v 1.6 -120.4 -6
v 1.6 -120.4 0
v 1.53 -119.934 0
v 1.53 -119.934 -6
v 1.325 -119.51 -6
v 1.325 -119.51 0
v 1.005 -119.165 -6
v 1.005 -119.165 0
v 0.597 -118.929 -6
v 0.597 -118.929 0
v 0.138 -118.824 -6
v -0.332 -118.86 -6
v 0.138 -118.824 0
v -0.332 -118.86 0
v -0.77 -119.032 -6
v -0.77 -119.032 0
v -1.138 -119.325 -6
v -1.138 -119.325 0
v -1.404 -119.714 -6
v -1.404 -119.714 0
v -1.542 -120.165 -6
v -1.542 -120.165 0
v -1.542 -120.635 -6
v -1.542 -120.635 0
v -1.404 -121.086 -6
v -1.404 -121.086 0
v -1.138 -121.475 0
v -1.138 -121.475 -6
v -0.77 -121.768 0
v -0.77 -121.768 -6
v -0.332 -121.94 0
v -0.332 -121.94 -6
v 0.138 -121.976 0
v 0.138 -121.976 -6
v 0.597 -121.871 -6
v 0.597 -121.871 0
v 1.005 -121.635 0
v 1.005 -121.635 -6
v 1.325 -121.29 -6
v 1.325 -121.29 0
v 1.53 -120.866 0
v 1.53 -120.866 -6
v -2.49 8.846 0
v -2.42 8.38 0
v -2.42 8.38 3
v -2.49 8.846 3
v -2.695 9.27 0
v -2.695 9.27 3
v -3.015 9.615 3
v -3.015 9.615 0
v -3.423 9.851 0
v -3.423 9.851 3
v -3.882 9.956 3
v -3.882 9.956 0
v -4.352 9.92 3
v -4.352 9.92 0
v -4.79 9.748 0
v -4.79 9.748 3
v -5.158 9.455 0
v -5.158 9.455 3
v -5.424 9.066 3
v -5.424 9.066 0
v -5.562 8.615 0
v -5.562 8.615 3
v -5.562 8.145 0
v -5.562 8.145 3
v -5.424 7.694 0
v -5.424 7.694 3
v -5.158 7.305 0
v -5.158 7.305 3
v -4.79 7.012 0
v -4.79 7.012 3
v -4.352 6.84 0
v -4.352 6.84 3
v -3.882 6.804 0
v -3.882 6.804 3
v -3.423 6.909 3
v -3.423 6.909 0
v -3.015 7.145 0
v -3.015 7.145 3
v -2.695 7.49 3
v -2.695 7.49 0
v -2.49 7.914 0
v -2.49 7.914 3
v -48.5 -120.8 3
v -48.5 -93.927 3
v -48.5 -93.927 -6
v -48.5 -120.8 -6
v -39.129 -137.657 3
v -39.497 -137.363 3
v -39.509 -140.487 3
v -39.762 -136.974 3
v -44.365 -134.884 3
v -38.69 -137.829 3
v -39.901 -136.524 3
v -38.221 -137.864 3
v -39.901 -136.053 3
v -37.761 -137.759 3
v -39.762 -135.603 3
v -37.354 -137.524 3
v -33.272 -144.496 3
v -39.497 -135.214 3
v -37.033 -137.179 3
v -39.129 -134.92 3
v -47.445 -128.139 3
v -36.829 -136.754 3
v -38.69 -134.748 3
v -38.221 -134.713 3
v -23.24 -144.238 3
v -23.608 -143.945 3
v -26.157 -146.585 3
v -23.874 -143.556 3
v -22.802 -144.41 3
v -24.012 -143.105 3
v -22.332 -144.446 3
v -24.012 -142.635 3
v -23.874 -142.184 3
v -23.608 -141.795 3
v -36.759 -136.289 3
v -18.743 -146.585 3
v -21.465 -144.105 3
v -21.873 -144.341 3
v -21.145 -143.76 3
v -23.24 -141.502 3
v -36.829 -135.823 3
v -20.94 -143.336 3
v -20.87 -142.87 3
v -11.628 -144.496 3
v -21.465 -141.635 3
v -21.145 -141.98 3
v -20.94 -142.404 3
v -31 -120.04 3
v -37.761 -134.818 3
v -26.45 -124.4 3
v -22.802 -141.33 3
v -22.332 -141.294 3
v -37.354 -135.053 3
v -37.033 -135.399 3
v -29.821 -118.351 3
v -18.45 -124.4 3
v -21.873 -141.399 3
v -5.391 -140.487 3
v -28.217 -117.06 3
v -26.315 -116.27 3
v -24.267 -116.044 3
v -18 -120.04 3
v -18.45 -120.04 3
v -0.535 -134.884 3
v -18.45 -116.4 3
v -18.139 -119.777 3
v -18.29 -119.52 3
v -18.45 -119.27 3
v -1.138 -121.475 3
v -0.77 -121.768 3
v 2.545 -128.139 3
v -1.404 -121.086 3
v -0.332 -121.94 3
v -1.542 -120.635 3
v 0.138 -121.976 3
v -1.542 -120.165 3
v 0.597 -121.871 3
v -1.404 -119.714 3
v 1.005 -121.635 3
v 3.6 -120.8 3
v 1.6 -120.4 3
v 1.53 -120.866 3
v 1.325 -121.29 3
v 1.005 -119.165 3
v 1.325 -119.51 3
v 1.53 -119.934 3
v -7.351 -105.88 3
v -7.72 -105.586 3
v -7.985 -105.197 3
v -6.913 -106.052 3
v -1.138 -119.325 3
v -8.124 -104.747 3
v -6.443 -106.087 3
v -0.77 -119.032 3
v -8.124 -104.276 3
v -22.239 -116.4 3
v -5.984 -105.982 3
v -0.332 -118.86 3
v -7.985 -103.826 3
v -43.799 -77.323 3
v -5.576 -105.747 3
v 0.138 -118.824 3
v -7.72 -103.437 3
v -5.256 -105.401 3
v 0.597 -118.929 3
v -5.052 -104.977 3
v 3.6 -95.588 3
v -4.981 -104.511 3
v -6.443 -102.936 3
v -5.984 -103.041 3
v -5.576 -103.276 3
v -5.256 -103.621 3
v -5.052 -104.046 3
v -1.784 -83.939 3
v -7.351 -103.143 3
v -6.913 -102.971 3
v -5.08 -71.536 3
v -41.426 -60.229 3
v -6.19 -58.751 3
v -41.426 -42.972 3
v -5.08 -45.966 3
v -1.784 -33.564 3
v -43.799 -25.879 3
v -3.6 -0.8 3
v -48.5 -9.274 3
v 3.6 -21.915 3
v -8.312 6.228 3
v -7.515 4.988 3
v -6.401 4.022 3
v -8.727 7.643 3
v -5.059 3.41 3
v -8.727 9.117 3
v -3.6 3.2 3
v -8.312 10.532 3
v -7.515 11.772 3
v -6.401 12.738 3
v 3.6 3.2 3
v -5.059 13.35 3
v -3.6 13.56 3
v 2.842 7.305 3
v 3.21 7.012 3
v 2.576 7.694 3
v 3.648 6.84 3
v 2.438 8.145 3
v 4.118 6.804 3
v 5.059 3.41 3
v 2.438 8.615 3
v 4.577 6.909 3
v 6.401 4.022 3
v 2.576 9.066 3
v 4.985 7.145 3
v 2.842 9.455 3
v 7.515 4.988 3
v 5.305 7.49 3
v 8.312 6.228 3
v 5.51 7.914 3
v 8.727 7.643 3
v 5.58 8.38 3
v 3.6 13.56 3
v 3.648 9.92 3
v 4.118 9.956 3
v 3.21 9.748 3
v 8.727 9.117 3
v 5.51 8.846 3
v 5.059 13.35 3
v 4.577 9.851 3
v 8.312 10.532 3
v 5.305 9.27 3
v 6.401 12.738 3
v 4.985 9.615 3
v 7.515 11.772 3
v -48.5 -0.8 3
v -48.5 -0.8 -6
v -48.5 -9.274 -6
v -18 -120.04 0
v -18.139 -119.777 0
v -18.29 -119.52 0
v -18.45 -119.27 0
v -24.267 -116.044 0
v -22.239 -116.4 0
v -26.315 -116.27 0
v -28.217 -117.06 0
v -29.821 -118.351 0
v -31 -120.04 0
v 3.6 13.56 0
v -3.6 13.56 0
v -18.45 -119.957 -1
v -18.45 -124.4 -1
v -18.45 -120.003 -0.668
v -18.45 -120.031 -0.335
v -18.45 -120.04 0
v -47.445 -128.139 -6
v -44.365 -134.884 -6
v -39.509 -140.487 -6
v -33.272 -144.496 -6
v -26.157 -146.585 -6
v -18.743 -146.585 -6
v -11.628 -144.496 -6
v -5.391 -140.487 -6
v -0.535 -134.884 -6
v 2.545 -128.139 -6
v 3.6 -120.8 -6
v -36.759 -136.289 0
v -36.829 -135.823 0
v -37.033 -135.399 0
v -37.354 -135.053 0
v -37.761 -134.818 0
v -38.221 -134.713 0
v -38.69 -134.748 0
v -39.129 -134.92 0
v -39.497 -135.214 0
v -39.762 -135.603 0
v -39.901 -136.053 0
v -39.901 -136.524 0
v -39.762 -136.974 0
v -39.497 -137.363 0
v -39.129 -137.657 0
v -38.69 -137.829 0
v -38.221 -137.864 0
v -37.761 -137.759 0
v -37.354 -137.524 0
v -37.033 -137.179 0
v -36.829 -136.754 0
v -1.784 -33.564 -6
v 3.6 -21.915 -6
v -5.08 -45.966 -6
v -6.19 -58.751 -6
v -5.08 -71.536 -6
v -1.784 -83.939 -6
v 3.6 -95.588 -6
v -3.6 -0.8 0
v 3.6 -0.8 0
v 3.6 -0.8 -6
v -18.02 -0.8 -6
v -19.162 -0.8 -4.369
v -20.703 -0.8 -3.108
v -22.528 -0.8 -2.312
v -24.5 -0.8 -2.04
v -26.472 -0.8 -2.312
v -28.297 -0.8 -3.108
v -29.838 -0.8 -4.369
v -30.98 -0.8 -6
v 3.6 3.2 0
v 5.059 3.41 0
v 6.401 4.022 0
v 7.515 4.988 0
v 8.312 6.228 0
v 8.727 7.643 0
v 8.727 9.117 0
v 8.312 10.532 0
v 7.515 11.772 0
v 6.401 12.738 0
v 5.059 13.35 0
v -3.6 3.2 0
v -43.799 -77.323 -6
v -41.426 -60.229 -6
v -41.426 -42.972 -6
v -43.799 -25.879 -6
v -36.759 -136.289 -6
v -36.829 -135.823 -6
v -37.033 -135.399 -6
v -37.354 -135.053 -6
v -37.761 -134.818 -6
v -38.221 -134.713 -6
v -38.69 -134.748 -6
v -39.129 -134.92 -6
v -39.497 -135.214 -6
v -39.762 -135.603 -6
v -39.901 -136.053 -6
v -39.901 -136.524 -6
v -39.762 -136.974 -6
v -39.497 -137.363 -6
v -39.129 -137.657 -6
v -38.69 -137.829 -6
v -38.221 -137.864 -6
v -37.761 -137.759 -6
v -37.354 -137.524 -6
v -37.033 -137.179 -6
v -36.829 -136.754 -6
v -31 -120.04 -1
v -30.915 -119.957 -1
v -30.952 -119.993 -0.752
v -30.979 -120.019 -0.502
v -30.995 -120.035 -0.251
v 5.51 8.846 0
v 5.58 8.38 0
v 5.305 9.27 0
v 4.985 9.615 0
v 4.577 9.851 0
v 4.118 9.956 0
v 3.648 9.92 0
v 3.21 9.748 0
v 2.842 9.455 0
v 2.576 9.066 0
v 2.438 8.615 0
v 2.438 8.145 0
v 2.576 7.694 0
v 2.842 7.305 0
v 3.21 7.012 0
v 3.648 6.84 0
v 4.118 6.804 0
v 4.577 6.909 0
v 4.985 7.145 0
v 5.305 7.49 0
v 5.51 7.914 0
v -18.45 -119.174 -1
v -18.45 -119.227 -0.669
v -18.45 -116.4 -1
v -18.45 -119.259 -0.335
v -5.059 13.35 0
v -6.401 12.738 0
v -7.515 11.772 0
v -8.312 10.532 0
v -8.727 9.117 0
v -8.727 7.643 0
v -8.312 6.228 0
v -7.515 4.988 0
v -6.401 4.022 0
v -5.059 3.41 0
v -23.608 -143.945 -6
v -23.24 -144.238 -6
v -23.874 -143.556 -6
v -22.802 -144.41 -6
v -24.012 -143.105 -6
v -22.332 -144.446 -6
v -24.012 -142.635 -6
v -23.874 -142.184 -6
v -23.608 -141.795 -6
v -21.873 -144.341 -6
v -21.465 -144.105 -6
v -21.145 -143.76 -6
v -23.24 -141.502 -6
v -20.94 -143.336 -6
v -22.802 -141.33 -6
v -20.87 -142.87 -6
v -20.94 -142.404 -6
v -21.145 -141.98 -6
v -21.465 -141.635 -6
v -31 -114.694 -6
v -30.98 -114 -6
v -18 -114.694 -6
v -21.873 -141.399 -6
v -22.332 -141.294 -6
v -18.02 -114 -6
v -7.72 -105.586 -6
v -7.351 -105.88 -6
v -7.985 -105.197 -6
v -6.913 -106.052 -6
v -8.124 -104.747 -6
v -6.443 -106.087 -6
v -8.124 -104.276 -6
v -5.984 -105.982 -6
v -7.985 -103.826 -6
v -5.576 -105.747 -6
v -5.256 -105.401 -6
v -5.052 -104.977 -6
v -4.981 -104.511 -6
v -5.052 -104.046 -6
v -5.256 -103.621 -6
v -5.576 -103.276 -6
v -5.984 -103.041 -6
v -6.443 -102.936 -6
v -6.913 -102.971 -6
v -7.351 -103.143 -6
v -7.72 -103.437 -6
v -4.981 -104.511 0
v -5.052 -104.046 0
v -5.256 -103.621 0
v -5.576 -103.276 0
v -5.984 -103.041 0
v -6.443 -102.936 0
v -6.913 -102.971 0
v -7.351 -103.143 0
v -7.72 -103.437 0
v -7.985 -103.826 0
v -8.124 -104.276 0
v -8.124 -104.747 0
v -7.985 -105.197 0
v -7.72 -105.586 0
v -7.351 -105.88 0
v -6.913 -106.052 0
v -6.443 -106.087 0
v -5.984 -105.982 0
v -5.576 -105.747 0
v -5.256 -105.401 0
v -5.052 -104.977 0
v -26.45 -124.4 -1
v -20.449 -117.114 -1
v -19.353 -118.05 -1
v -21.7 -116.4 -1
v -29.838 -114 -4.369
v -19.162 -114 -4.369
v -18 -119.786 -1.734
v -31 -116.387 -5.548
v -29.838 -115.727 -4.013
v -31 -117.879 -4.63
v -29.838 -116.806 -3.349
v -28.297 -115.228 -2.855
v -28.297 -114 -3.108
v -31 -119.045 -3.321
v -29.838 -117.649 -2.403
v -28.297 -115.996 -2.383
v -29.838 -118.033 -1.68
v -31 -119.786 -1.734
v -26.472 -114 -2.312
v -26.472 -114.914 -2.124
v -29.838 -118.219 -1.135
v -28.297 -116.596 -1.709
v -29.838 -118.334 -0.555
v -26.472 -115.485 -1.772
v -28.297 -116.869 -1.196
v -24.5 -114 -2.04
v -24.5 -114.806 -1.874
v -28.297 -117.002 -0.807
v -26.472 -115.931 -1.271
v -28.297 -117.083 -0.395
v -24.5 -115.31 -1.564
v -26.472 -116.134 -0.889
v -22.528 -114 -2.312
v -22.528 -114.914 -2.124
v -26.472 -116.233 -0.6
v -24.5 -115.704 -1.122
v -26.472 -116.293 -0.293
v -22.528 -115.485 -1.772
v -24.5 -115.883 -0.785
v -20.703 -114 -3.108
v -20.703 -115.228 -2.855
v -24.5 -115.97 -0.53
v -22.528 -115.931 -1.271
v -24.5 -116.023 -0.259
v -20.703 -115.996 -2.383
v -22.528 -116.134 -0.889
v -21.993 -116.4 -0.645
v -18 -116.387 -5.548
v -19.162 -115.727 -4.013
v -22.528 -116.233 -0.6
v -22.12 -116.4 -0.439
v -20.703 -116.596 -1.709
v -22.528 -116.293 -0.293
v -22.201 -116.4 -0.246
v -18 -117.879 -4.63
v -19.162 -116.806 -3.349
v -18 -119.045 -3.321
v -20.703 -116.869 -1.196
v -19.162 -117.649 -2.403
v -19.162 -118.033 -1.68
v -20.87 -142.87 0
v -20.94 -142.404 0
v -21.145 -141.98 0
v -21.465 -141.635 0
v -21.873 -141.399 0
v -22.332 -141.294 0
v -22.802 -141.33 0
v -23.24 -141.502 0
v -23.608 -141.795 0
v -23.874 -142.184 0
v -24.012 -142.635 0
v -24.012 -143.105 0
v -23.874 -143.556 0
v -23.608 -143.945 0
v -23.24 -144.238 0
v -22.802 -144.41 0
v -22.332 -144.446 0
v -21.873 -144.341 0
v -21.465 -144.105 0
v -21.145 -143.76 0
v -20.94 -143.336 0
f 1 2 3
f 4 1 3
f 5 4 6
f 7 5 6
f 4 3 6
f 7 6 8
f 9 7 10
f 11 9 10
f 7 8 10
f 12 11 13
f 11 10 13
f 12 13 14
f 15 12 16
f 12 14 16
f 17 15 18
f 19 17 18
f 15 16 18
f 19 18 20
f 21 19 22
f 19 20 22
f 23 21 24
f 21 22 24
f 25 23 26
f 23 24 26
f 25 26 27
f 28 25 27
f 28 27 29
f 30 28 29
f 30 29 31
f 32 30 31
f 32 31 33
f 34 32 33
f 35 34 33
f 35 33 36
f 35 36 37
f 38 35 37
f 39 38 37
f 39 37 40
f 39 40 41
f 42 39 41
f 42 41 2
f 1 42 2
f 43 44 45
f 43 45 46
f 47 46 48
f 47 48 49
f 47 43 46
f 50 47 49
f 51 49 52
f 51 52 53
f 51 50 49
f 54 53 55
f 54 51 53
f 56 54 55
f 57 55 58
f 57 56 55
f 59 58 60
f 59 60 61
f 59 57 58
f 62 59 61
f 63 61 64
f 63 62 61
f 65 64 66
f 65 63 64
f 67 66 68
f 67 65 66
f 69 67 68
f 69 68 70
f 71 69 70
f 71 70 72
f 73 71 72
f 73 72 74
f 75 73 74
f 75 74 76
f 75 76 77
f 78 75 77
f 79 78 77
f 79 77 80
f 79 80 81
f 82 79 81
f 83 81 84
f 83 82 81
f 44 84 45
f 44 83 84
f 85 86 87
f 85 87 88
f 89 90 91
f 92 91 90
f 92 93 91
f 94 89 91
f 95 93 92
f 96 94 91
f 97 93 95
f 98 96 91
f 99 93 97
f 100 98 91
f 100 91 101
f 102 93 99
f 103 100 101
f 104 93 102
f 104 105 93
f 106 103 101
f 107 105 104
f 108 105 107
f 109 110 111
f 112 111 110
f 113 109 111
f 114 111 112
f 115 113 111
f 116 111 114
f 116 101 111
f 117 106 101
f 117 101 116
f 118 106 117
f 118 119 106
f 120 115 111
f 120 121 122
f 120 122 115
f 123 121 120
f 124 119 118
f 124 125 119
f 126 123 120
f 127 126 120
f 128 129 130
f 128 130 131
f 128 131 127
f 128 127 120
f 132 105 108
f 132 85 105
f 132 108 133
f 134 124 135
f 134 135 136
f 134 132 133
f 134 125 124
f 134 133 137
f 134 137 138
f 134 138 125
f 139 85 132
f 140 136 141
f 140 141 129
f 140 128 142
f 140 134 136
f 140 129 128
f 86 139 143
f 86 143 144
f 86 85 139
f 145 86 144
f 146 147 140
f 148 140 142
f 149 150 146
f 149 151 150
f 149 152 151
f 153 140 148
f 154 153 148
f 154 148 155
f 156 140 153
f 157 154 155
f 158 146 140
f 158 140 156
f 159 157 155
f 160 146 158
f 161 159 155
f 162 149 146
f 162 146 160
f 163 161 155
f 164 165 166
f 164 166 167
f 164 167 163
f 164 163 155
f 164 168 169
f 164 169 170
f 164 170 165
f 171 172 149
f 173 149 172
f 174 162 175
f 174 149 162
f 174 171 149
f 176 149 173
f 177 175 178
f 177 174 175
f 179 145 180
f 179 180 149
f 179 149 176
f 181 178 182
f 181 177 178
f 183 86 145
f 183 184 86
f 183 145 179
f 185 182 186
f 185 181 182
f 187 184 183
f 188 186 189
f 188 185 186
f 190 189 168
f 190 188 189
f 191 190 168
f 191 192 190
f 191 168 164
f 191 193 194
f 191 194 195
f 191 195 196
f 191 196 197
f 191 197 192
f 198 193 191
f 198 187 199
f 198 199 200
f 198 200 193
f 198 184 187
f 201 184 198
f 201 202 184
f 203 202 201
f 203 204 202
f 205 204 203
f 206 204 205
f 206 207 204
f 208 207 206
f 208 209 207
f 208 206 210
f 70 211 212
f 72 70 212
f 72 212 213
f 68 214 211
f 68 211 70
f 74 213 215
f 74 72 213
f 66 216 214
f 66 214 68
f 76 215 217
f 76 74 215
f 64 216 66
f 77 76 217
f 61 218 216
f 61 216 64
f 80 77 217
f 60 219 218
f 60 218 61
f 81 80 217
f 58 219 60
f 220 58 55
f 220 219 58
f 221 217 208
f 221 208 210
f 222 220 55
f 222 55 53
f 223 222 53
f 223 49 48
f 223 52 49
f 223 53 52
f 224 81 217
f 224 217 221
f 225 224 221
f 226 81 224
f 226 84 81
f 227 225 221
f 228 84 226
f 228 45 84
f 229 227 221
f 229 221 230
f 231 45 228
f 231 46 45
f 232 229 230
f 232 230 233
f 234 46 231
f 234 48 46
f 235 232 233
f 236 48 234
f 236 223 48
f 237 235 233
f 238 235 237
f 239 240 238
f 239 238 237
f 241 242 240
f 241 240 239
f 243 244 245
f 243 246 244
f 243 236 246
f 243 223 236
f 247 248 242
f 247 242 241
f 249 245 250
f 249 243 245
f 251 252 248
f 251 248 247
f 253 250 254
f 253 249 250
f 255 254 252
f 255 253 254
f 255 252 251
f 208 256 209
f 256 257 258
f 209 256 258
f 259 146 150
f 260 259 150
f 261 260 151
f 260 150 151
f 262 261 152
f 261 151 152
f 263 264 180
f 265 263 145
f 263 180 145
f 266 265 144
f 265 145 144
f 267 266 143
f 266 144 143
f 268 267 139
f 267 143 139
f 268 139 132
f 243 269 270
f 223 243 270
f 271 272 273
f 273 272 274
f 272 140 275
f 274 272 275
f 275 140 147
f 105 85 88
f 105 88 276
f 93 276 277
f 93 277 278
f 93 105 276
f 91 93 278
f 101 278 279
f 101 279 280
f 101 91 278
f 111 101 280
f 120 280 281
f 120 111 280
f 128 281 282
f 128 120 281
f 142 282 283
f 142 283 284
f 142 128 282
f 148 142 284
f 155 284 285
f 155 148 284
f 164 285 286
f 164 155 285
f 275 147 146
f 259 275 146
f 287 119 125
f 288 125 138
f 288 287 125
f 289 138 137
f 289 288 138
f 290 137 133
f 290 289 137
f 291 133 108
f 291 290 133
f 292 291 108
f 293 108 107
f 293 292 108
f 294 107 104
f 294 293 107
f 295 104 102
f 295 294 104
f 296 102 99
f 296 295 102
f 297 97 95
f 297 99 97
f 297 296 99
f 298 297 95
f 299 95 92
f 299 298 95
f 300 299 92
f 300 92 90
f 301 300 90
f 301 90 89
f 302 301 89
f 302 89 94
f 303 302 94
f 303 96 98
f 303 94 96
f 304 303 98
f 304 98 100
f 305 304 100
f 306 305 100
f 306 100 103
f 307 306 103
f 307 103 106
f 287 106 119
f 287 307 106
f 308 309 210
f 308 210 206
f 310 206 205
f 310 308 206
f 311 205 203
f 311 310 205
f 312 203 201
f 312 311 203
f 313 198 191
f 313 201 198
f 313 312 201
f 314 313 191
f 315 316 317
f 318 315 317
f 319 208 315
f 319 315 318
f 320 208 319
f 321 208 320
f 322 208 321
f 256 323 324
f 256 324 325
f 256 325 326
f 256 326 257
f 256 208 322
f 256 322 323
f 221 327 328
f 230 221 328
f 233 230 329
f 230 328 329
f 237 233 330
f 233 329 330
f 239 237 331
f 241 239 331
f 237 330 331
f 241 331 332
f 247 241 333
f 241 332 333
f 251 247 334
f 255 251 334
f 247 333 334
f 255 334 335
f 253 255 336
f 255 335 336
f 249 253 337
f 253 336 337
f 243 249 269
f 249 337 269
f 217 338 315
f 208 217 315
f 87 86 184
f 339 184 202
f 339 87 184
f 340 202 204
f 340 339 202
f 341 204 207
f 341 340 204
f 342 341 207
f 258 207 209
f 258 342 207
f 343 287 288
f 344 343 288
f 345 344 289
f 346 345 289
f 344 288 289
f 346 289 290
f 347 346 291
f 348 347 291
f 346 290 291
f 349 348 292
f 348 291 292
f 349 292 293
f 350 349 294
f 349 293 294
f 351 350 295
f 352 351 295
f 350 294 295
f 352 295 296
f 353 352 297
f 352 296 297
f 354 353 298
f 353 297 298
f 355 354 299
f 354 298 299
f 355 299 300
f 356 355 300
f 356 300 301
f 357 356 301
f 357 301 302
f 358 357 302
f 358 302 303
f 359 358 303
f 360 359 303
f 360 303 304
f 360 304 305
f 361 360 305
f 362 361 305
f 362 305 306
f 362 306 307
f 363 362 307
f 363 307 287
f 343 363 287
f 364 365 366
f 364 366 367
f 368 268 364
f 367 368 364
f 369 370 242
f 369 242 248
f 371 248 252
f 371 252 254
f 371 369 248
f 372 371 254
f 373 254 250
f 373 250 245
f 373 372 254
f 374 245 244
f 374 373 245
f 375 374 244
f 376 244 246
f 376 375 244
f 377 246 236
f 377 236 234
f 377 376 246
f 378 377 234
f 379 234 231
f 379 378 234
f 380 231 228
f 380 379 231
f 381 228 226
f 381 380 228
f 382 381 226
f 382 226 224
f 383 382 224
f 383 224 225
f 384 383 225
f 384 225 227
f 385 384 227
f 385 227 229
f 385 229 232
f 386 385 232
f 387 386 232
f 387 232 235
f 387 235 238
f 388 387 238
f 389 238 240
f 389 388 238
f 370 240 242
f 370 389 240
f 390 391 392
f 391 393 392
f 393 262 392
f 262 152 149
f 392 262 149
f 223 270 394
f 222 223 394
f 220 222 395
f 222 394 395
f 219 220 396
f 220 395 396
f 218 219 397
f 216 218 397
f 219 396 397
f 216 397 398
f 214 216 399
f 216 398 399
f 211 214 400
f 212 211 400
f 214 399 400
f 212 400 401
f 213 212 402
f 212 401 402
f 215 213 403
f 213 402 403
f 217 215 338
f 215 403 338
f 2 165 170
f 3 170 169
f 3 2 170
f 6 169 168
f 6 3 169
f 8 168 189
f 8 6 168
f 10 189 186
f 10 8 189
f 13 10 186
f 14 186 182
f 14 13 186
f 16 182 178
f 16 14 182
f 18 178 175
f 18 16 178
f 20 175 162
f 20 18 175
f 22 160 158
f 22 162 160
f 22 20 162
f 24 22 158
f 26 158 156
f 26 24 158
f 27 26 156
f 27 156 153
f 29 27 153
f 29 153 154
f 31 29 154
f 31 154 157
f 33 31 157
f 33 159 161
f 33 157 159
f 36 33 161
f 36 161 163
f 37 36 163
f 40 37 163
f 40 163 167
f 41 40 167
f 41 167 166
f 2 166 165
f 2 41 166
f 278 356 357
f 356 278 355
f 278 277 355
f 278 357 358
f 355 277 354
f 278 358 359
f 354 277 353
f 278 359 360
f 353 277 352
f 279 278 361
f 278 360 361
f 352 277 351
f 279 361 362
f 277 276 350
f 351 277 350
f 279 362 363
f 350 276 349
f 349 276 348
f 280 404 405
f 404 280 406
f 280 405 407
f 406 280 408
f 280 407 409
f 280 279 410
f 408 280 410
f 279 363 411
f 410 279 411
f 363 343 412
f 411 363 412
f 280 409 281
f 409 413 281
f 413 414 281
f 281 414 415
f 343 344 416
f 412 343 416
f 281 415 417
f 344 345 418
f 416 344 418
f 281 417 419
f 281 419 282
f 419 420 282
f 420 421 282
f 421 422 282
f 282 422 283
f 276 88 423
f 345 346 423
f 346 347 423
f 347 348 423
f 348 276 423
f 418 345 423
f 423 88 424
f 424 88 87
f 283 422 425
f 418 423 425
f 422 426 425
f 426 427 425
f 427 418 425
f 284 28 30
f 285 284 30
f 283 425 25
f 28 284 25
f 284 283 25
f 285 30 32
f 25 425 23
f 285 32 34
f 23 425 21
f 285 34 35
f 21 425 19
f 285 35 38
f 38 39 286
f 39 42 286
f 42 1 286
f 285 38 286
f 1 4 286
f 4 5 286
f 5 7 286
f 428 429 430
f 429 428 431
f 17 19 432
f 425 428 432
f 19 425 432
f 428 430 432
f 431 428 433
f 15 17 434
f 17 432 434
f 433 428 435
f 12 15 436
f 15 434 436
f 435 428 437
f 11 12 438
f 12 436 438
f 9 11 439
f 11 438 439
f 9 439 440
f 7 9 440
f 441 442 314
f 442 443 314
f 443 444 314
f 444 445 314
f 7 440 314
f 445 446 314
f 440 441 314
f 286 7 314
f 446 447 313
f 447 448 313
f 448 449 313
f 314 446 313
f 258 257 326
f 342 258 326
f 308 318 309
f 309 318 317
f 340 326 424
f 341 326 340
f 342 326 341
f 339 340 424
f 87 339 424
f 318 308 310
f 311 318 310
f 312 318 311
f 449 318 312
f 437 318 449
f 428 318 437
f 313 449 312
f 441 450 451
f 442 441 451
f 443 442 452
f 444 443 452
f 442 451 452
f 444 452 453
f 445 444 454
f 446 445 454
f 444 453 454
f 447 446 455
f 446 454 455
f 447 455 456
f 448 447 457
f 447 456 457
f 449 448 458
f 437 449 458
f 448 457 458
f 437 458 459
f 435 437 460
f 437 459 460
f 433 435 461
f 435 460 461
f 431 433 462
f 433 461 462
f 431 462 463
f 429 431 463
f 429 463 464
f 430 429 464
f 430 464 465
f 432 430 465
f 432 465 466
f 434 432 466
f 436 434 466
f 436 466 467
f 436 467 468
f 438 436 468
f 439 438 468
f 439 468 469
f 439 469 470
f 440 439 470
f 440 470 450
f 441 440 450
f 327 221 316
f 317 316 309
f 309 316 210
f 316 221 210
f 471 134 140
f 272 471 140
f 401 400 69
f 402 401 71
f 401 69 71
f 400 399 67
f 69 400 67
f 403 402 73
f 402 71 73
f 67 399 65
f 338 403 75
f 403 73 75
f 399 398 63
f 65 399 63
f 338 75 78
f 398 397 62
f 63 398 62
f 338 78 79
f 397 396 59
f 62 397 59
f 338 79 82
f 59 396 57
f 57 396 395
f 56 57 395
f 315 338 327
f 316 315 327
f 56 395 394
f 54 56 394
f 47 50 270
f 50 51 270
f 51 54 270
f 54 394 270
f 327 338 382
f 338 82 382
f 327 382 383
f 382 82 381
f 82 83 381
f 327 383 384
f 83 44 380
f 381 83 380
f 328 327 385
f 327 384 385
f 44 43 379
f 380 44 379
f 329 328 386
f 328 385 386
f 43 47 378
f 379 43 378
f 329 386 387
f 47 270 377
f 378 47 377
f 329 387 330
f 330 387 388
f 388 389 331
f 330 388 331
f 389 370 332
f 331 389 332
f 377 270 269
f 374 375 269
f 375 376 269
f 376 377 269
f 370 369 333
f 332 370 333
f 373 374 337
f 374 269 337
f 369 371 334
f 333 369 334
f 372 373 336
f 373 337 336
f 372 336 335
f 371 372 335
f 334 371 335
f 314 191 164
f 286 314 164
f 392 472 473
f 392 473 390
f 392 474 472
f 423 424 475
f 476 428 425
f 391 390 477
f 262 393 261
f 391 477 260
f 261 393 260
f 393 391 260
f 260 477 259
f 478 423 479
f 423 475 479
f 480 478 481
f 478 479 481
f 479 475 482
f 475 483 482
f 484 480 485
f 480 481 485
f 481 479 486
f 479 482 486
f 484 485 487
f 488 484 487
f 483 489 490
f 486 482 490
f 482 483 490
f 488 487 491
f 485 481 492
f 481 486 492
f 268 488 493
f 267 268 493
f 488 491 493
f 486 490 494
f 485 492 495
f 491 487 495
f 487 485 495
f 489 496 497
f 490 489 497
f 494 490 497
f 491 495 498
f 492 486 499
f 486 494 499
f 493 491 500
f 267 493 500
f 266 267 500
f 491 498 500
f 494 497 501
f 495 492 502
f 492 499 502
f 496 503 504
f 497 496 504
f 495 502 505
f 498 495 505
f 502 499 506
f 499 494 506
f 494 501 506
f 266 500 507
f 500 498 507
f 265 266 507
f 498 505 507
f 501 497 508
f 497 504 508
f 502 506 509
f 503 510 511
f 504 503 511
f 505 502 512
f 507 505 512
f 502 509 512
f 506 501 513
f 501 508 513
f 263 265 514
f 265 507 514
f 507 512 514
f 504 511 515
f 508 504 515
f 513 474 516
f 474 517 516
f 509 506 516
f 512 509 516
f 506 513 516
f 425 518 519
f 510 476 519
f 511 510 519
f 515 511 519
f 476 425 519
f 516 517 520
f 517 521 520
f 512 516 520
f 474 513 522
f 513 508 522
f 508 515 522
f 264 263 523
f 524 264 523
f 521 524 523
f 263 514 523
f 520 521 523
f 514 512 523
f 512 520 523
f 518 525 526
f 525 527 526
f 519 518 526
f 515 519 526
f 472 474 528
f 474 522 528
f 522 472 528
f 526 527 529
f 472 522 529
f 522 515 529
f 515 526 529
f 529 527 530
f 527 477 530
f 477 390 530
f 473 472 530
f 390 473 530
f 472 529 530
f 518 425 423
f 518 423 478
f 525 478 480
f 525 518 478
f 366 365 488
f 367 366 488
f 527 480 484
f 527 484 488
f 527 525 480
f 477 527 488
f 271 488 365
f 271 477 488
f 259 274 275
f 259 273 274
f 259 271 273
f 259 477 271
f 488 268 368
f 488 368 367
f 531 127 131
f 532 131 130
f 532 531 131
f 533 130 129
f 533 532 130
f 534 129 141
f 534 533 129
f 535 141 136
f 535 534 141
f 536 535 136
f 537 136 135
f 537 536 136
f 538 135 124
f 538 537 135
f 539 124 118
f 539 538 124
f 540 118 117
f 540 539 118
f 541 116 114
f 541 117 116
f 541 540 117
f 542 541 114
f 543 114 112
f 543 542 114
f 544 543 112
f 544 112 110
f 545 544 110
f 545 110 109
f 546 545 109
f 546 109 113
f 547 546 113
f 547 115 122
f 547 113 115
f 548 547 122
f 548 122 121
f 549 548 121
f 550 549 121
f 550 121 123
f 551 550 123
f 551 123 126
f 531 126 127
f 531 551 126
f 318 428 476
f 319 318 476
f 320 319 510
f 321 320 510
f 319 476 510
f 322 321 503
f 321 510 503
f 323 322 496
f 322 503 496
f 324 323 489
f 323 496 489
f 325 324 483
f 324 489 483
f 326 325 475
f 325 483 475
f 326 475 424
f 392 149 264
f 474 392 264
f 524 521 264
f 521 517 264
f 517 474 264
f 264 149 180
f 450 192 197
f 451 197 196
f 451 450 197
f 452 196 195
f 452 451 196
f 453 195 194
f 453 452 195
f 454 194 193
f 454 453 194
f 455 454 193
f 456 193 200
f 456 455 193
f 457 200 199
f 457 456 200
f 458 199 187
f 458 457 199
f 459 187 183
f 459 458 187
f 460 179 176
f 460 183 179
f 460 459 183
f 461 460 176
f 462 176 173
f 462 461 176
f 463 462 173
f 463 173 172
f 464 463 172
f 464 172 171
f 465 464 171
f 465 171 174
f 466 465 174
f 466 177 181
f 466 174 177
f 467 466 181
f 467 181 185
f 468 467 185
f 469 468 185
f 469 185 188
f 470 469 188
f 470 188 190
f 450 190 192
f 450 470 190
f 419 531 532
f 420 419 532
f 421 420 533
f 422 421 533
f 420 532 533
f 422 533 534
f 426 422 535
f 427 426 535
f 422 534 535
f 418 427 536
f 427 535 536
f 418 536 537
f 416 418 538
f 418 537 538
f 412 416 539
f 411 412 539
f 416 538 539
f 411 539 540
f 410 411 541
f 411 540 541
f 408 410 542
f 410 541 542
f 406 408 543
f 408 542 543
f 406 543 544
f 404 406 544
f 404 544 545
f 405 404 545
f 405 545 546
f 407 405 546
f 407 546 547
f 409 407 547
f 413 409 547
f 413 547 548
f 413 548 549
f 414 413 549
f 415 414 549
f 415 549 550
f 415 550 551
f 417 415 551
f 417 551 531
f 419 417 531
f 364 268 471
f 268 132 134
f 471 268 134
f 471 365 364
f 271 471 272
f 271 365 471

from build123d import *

# Parameters (mm, degrees)
SKETCH_R             = 1.58
PAD_DEPTH            = 3
PAD001_DEPTH         = 6
POCKET_DEPTH         = 4
SKETCH006_R          = 1.58
POCKET001_DEPTH      = 6.001
POCKET001_DEPTH_BACK = -3.001
POCKET002_DEPTH      = 6.001
POCKET002_DEPTH_BACK = -3.001


with BuildPart() as part:
    # Sketch → Pad (new body)
    with BuildSketch(Plane.XY):
        with BuildLine():
            ThreePointArc((-3.6, 13.56), (-8.78, 8.38), (-3.6, 3.2))
            Line((-3.6, 3.2), (-3.6, 0))
            Line((-3.6, 0), (-3.6, -0.8))
            Line((-48.5, -0.8), (-3.6, -0.8))
            Line((-48.5, -0.8), (-48.5, -120.8))
            ThreePointArc((-48.5, -120.8), (-22.45, -146.85), (3.6, -120.8))
            Line((3.6, 0), (3.6, -120.8))
            Line((3.6, 3.2), (3.6, 0))
            ThreePointArc((3.6, 3.2), (8.78, 8.38), (3.6, 13.56))
            Line((3.6, 13.56), (0, 13.56))
            Line((-3.6, 13.56), (0, 13.56))
        make_face()
        with Locations((-4, 8.38)):
            Circle(SKETCH_R, mode=Mode.SUBTRACT)
        with Locations((4, 8.38)):
            Circle(SKETCH_R, mode=Mode.SUBTRACT)
    extrude(amount=PAD_DEPTH)

    # Sketch001 → Pad001 (join)
    with BuildSketch(Plane.XY):
        with BuildLine():
            Line((3.6, -0.8), (-48.5, -0.8))
            Line((-48.5, -0.8), (-48.5, -120.8))
            ThreePointArc((-48.5, -120.8), (-22.45, -146.85), (3.6, -120.8))
            Line((3.6, -0.8), (3.6, -120.8))
        make_face()
    extrude(amount=-PAD001_DEPTH)

    # SubtractivePipe: sweep along a path in Sketch004
    with BuildLine(Plane.YZ) as subtractivepipe_path:
        Line((0, -6), (-114, -6))
        ThreePointArc((-114, -6), (-118.242641, -4.242641), (-120, 0))
        Line((-120, 0), (-120, 3))
    # Sketch002 → SubtractivePipe (sweep, cut)
    with BuildSketch(Plane.XZ):
        with BuildLine():
            Line((-24.5, -6.04), (-31, -6.04))
            ThreePointArc((-18, -6.04), (-24.5, -2.04), (-31, -6.04))
            Line((-24.5, -6.04), (-18, -6.04))
        make_face()
    sweep(path=subtractivepipe_path.line, mode=Mode.SUBTRACT)

    # Sketch005 → Pocket (cut)
    with BuildSketch(Plane.XY.offset(3)):
        Polygon((-26.45, -124.4), (-18.45, -124.4), (-18.45, -116.4), (-26.45, -116.4), (-27.691676, -116.776802), (-31, -120.04), align=None)
    extrude(amount=-POCKET_DEPTH, mode=Mode.SUBTRACT)

    # Sketch006 → Pocket001 (cut, two sides)
    with BuildSketch(Plane.XY) as pocket001_sk:
        with Locations((-22.45, -142.87)):
            Circle(SKETCH006_R)
        with Locations((0.02, -120.4)):
            Circle(SKETCH006_R)
        with Locations((-6.561311, -104.511311)):
            Circle(SKETCH006_R)
        with Locations((-38.338689, -136.288689)):
            Circle(SKETCH006_R)
    extrude(amount=-POCKET001_DEPTH, mode=Mode.SUBTRACT)
    extrude(pocket001_sk.sketch, amount=-POCKET001_DEPTH_BACK, mode=Mode.SUBTRACT)

    # Sketch007 → Pocket002 (cut, two sides)
    with BuildSketch(Plane.XY) as pocket002_sk:
        with BuildLine():
            Line((-58.822819, 0), (-58.822819, -99.491015))
            Line((-58.822819, -99.491015), (-50.649527, -99.491015))
            ThreePointArc((-50.649527, -99.491015), (-41.14496, -49.579042), (-52.256237, 0))
            Line((-52.256237, 0), (-52.256237, 31.290133))
            Line((-52.256237, 31.290133), (11.992633, 31.290133))
            Line((11.992633, -10.093772), (11.992633, 31.290133))
            ThreePointArc((11.992633, -10.093772), (-6.175004, -57.263804), (10.086987, -105.124252))
            Line((35.256332, -105.124252), (10.086987, -105.124252))
            Line((35.256332, 66.325943), (35.256332, -105.124252))
            Line((-58.822819, 66.325943), (35.256332, 66.325943))
            Line((-58.822819, 0), (-58.822819, 66.325943))
        make_face()
    extrude(amount=-POCKET002_DEPTH, mode=Mode.SUBTRACT)
    extrude(pocket002_sk.sketch, amount=-POCKET002_DEPTH_BACK, mode=Mode.SUBTRACT)


solid = part.part
